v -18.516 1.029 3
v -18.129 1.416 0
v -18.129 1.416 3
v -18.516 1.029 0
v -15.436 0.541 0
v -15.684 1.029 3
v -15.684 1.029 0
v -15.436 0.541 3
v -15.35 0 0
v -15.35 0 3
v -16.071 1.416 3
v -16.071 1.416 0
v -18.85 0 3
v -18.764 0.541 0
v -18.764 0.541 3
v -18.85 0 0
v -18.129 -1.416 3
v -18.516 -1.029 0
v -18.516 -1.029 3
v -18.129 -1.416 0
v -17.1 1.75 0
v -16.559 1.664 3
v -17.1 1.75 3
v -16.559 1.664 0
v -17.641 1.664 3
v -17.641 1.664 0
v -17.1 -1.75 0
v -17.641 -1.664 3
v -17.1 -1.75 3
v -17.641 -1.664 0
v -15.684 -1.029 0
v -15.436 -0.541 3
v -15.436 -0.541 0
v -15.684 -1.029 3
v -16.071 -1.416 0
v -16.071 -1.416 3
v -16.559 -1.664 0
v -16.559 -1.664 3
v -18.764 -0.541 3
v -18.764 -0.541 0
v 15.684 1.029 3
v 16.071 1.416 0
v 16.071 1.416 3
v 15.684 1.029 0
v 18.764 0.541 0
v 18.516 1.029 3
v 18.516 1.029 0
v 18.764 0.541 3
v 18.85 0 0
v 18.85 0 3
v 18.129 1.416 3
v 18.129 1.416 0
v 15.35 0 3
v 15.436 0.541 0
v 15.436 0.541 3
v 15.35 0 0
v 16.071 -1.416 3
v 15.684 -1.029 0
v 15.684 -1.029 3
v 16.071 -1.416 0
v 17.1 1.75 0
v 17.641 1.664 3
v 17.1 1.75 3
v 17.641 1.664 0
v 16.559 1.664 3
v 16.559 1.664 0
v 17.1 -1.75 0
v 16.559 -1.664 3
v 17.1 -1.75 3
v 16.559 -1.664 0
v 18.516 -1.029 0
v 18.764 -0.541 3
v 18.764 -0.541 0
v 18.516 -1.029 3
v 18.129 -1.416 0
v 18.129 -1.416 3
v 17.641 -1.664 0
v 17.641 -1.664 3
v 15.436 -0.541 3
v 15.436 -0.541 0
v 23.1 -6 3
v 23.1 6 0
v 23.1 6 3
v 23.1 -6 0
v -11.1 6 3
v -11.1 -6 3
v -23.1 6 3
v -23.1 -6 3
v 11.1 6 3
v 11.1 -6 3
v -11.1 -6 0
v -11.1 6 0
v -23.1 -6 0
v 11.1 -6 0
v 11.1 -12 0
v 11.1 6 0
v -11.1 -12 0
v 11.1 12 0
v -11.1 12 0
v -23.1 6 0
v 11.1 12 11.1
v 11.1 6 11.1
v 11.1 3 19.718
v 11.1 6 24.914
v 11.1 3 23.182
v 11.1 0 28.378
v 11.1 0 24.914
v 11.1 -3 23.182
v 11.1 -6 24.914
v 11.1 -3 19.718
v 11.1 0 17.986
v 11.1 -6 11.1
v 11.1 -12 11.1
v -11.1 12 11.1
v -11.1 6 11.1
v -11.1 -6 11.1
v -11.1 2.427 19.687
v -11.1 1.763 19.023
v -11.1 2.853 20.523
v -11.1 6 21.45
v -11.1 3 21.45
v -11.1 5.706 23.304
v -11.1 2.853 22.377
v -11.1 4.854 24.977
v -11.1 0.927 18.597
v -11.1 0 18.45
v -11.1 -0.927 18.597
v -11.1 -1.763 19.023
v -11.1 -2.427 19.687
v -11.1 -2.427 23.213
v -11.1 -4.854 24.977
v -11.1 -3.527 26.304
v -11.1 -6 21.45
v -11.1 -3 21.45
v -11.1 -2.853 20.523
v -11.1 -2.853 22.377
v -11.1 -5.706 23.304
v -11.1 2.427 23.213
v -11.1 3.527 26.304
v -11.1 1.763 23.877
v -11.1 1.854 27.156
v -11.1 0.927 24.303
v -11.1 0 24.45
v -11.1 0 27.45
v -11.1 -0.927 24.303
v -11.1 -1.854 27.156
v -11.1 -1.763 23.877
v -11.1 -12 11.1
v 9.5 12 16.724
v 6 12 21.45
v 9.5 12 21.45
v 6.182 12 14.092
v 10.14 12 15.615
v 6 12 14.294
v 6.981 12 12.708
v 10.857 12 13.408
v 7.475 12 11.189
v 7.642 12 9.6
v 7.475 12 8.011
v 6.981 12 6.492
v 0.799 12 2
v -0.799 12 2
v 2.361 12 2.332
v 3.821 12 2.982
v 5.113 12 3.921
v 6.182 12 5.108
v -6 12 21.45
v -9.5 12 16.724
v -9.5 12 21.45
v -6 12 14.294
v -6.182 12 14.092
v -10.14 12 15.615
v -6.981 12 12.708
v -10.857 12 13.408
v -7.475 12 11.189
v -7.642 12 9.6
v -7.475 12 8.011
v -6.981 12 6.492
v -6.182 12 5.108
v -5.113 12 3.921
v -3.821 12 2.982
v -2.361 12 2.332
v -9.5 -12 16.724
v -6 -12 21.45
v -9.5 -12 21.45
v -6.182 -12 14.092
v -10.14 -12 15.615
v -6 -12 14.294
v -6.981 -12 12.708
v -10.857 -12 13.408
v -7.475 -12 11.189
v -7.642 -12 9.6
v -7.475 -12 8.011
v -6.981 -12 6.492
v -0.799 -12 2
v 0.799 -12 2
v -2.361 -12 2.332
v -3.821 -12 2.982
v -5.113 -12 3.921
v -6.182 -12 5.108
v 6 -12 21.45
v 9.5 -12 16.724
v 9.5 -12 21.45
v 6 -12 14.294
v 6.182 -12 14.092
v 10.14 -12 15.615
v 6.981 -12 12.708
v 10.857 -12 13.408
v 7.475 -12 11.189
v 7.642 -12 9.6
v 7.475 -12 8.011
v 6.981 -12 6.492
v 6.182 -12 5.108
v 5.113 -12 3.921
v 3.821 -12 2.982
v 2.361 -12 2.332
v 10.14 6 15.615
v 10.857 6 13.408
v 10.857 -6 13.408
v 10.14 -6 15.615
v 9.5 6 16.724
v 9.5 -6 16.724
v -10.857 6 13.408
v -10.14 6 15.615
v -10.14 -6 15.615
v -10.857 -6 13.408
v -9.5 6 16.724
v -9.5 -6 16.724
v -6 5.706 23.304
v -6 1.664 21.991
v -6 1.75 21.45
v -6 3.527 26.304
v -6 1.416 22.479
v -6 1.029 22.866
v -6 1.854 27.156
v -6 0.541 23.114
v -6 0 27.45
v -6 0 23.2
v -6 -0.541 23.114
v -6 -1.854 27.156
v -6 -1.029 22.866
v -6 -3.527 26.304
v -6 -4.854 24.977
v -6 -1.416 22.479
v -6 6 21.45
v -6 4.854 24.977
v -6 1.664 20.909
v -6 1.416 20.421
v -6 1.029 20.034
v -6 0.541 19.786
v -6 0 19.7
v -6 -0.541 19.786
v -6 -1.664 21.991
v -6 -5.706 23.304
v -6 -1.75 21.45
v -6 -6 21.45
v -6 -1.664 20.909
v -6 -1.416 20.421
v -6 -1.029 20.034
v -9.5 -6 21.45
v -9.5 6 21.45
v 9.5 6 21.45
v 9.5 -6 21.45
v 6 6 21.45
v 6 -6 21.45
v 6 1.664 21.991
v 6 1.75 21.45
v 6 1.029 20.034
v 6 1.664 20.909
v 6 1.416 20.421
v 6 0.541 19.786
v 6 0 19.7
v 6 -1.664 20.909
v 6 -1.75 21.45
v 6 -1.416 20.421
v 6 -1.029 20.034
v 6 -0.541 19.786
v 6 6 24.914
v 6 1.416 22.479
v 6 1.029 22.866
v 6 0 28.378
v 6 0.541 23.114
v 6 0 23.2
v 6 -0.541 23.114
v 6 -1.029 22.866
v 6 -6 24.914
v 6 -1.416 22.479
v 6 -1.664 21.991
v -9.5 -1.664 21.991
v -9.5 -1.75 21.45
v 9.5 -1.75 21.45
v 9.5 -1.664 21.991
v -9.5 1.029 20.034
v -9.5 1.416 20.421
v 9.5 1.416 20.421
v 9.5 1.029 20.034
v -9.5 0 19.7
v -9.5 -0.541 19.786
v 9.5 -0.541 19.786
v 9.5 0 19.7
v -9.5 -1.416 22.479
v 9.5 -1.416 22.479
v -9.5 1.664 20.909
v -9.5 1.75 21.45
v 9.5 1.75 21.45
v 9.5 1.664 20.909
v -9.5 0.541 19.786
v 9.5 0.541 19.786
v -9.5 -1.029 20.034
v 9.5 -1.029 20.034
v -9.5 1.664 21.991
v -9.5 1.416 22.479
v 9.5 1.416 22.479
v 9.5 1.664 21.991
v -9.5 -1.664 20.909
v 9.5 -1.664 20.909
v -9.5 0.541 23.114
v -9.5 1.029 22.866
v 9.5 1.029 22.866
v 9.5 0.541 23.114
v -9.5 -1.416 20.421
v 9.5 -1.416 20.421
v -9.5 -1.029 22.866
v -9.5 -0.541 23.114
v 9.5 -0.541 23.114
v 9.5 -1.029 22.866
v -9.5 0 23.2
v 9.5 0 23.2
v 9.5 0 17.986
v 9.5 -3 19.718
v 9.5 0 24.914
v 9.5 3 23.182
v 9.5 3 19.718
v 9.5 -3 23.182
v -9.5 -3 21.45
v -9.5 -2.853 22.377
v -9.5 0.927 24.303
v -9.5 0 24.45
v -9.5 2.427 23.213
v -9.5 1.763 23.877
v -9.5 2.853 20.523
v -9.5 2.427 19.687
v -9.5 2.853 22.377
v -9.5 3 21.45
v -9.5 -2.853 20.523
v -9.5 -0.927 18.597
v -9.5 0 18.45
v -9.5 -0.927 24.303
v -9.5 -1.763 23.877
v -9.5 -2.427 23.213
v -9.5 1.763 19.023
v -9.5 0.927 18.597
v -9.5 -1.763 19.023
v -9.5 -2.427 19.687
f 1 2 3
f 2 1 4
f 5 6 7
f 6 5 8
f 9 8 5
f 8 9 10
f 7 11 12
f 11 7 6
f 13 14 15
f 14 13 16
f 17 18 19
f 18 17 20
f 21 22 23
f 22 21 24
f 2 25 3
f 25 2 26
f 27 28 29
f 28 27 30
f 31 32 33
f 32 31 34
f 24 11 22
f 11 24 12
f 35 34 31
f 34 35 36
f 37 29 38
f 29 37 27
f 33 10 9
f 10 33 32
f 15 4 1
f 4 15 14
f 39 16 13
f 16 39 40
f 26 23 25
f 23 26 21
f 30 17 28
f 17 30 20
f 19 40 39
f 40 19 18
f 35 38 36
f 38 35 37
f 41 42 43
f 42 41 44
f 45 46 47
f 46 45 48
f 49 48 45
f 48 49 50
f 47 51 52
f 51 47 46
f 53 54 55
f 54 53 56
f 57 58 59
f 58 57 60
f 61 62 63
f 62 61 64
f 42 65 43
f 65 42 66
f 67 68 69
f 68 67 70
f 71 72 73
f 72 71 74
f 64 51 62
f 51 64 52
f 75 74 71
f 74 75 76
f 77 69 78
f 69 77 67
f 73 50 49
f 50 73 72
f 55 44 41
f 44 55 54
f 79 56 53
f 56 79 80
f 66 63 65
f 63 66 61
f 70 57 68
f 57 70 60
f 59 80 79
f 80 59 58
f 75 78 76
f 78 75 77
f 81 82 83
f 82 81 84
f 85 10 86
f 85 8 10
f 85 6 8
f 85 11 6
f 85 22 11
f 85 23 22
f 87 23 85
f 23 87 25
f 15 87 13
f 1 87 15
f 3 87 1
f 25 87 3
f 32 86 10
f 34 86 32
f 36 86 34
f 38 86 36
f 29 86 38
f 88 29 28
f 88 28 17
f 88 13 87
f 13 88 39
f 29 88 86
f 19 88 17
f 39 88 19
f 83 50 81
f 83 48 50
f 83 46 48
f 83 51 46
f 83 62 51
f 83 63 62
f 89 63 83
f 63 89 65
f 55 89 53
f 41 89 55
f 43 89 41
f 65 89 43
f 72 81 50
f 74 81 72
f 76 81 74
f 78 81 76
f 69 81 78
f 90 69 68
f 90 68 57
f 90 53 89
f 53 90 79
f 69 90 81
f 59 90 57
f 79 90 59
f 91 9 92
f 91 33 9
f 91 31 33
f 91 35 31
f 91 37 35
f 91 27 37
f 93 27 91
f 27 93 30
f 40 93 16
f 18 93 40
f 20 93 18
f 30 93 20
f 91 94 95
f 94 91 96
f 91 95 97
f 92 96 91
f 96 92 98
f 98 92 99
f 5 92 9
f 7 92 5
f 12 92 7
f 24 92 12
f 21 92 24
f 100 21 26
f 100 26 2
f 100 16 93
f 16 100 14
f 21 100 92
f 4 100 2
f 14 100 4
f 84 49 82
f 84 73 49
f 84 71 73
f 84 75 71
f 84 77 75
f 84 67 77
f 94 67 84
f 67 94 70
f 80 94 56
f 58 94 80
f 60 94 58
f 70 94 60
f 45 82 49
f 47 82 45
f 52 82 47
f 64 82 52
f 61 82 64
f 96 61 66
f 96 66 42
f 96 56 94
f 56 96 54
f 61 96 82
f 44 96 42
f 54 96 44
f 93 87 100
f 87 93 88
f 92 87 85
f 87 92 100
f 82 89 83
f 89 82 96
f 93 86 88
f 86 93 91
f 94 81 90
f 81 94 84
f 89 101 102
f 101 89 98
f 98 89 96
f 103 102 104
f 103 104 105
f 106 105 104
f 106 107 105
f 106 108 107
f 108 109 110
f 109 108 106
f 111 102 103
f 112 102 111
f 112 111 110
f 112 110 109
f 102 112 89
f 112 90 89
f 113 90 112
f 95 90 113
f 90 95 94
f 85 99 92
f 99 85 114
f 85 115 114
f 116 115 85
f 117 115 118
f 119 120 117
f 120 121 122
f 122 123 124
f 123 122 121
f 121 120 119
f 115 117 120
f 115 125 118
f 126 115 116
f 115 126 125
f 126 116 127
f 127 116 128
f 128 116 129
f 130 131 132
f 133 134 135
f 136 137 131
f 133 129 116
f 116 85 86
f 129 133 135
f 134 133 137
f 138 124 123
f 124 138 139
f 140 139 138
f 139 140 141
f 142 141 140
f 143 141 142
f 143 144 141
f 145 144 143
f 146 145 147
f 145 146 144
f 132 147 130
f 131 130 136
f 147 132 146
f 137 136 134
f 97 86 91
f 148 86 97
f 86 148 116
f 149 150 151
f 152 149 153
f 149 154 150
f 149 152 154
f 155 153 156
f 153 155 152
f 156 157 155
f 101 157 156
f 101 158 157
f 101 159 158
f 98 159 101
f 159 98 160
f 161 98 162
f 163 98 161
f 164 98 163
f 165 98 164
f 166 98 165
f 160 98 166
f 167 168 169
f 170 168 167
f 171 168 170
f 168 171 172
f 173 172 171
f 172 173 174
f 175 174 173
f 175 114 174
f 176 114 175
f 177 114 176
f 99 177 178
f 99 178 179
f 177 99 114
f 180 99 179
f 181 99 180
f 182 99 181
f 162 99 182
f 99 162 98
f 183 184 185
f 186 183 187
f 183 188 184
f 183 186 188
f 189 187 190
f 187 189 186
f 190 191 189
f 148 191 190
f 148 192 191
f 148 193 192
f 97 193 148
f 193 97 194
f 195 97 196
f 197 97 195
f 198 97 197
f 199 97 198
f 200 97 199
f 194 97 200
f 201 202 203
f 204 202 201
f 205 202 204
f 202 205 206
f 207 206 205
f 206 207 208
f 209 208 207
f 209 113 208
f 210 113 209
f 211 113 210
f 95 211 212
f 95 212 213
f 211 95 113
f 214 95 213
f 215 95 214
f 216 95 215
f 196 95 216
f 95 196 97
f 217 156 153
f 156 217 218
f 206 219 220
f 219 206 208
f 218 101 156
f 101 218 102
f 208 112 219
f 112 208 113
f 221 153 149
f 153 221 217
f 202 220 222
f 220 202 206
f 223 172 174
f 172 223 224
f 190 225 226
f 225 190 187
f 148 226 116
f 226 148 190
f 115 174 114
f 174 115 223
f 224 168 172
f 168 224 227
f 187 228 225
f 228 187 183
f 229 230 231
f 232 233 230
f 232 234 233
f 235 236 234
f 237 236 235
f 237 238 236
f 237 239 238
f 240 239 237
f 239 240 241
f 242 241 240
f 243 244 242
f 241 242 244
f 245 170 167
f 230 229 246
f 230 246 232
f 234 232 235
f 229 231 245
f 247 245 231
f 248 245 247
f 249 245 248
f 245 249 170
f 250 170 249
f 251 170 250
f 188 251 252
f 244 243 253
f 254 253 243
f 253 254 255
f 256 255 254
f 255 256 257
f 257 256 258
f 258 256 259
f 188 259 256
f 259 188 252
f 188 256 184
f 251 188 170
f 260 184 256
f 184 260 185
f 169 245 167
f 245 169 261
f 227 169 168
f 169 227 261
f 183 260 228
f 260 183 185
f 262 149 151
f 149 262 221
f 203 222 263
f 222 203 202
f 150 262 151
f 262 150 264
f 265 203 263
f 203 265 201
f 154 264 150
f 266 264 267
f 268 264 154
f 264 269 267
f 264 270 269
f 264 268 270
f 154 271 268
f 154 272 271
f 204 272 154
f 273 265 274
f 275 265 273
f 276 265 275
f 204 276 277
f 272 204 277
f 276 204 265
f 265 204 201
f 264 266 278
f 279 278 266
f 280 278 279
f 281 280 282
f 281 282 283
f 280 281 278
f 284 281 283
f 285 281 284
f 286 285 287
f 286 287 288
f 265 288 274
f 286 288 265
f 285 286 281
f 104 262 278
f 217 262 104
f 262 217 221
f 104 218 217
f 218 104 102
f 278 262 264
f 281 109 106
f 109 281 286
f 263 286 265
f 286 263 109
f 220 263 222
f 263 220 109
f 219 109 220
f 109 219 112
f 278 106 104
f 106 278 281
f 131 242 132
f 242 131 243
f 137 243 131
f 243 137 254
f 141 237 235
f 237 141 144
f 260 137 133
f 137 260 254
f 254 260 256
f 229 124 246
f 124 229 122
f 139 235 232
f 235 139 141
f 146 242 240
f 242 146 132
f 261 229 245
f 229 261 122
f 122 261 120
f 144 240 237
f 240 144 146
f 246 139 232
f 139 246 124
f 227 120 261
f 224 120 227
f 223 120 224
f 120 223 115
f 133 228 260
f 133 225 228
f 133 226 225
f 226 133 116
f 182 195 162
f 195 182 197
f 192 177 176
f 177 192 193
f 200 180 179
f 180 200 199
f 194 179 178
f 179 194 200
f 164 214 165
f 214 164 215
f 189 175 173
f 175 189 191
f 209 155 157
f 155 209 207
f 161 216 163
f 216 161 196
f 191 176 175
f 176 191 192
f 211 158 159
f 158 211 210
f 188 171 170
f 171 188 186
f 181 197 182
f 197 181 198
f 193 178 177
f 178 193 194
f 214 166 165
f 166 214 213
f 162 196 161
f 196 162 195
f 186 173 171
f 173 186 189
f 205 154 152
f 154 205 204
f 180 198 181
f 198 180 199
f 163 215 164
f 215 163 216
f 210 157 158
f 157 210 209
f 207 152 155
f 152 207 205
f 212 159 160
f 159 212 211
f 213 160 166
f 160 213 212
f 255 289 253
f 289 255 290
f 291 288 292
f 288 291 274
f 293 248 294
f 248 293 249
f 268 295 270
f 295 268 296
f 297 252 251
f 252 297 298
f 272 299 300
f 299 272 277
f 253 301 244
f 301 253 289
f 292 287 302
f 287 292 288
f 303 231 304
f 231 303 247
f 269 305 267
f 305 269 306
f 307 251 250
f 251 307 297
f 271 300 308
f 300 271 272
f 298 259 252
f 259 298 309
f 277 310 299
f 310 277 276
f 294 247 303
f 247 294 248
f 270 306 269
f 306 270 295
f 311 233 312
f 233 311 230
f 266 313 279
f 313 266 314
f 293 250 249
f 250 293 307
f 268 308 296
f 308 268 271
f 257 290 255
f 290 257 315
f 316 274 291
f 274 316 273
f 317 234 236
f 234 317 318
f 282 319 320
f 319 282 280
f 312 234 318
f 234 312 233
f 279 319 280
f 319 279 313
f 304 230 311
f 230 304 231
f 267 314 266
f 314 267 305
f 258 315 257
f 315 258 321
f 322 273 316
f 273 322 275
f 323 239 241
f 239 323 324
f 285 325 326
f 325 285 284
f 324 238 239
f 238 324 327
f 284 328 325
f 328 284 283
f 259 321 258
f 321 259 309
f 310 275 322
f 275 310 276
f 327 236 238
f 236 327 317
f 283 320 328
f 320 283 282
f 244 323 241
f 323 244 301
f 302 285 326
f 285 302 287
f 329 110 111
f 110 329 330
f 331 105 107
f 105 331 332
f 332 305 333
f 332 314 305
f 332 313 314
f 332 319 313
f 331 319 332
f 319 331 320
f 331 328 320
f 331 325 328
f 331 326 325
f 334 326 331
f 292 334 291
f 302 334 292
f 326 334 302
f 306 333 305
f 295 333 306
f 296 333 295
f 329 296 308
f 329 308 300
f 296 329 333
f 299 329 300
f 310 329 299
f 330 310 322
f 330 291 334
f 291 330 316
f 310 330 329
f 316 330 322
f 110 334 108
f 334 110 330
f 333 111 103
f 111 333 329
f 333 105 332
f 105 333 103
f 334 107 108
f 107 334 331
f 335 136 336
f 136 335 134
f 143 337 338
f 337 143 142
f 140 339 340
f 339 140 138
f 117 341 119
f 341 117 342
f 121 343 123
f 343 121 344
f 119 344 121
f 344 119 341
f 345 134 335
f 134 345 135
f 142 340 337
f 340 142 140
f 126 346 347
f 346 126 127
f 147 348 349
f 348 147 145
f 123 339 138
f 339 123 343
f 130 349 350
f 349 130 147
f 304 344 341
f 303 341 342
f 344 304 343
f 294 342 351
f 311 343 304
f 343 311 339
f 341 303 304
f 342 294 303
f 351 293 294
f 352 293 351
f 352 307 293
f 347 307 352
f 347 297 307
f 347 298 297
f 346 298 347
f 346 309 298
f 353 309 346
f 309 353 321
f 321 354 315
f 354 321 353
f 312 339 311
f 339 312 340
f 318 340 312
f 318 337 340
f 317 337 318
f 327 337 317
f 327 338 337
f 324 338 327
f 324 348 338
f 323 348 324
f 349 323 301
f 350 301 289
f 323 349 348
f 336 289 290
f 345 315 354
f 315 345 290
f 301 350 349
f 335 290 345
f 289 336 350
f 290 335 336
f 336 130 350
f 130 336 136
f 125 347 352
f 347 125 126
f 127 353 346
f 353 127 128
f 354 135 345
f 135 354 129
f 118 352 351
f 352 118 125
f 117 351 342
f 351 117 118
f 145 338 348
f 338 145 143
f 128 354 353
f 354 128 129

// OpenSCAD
// LM8UU holder slim v1.1
// *********************************************
// Jonas Kühling
// http://www.jonaskuehling.de
// http://www.thingiverse.com/jonaskuehling
// *********************************************
// derived from:
// http://www.thingiverse.com/thing:14942

// LM8UU/rod dimensions
LM8UU_dia = 15.2;
LM8UU_length = 24;
rod_dia = 8;

//screw/nut dimensions (M3) - hexagon socket head cap screw ISO 4762, hexagon nut ISO 4032
screw_thread_dia_iso = 3;
screw_head_dia_iso = 5.5;
nut_wrench_size_iso = 5.5;


// screw/nut dimensions for use (plus clearance for fitting purpose)
clearance_dia = 0.5;
screw_thread_dia = screw_thread_dia_iso + clearance_dia;
screw_head_dia = screw_head_dia_iso + clearance_dia;
nut_wrench_size = nut_wrench_size_iso + clearance_dia;
nut_dia_perimeter = (nut_wrench_size/cos(30));
nut_dia = nut_dia_perimeter;
nut_surround_thickness = 3;

// main body dimensions
body_wall_thickness = 3.5;
body_width = LM8UU_dia + (2*body_wall_thickness);
body_height = body_width;
body_length = LM8UU_length;
gap_width = rod_dia + 4;
screw_bushing_space = 1;
screw_elevation = LM8UU_dia + body_wall_thickness + (screw_thread_dia/2) +screw_bushing_space;

// TEST - uncomment to render in openscad:
lm8uu_holder(1);		// WITH mountplate
// lm8uu_holder();		// WITHOUT mountplate


// nophead's polyhole module for better lm8uu-fit
module polyhole(d,h) {
    n = max(round(2 * d),3);
    rotate([0,0,180])
        cylinder(h = h, r = (d / 2) / cos (180 / n), $fn = n);
}


module mount_plate()
{
	difference()
	{
		translate([0,0,1.5])
		cube([body_width+2*screw_head_dia+4*nut_surround_thickness,screw_head_dia+2*nut_surround_thickness,3], center=true);

		for(i=[-1,1])
			translate([i*(body_width/2+nut_surround_thickness+screw_head_dia/2),0,-0.5])
				cylinder(r=screw_thread_dia/2, h=4, $fn=20);
	}
}

// main body
module lm8uu_holder(with_mountplate=false)
{
	difference()
	{
		union()
		{
			if (with_mountplate) 
			mount_plate();
	
			// body
			translate([0,0,body_height/4])
				cube([body_width,body_length,body_height/2], center=true);
			translate([0,0,(LM8UU_dia/2)+body_wall_thickness])		
				rotate([90,0,0])
					cylinder(r=(LM8UU_dia/2)+body_wall_thickness, h=LM8UU_length, center=true);
	
			// gap support
			translate([-(gap_width/2)-body_wall_thickness,-(body_length/2),body_height/2])
				cube([body_wall_thickness,LM8UU_length,(LM8UU_dia/2)+screw_bushing_space+(screw_thread_dia/2)]);
			translate([gap_width/2,-(body_length/2),body_height/2])
				cube([body_wall_thickness,LM8UU_length,(LM8UU_dia/2)+screw_bushing_space+(screw_thread_dia/2)]);
	
	
			// nut trap surround
			translate([gap_width/2,0,screw_elevation])
				rotate([0,90,0])
					cylinder(r=(((nut_wrench_size+nut_surround_thickness*2)/cos(30))/2), h=(body_width-gap_width)/2, $fn=6);
			translate([gap_width/2+(body_width-gap_width)/4,0,screw_elevation/2])
				cube([(body_width-gap_width)/2,nut_wrench_size+(nut_surround_thickness*2),screw_elevation],center=true);

			// Screw hole surround
			translate([-gap_width/2,0,screw_elevation])
				rotate([0,-90,0])
					cylinder(r=(screw_head_dia/2)+nut_surround_thickness, h=(body_width-gap_width)/2, $fn=20);
			translate([-(gap_width/2+(body_width-gap_width)/4),0,screw_elevation/2])
				cube([(body_width-gap_width)/2,screw_head_dia+(nut_surround_thickness*2),screw_elevation],center=true);
		}
	
		// bushing hole
		translate([0,0,LM8UU_dia/2+2])
			rotate([90,0,0])
//				cylinder(r=LM8UU_dia/2, h=LM8UU_length+1, center=true);
				translate([0,0,-(LM8UU_length+1)/2]) polyhole(LM8UU_dia,LM8UU_length+1);	// TESTING POLYHOLE MODULE FOR BETTER LM8UU FIT
	
		// top gap
		translate([-(gap_width/2),-(body_length/2)-1,body_height/2])
			cube([gap_width,LM8UU_length+2,(LM8UU_dia/2)+screw_bushing_space+(screw_thread_dia/2)+(nut_dia/2)+nut_surround_thickness+1]);
	
		// screw hole (one all the way through)
		translate([0,0,screw_elevation])
			rotate([0,90,0])
				cylinder(r=screw_thread_dia/2, h=body_width+3, center=true, $fn=20);
	
		// nut trap
		translate([gap_width/2+body_wall_thickness,0,screw_elevation])
			rotate([0,90,0])
				cylinder(r=nut_dia/2, h=body_width/2-gap_width/2-body_wall_thickness+1,$fn=6);
	
		// screw head hole
		translate([-(gap_width)/2-body_wall_thickness,0,screw_elevation])
			rotate([0,-90,0])
				cylinder(r=screw_head_dia/2, h=body_width/2-gap_width/2-body_wall_thickness+1,$fn=20);
	
	}
}
